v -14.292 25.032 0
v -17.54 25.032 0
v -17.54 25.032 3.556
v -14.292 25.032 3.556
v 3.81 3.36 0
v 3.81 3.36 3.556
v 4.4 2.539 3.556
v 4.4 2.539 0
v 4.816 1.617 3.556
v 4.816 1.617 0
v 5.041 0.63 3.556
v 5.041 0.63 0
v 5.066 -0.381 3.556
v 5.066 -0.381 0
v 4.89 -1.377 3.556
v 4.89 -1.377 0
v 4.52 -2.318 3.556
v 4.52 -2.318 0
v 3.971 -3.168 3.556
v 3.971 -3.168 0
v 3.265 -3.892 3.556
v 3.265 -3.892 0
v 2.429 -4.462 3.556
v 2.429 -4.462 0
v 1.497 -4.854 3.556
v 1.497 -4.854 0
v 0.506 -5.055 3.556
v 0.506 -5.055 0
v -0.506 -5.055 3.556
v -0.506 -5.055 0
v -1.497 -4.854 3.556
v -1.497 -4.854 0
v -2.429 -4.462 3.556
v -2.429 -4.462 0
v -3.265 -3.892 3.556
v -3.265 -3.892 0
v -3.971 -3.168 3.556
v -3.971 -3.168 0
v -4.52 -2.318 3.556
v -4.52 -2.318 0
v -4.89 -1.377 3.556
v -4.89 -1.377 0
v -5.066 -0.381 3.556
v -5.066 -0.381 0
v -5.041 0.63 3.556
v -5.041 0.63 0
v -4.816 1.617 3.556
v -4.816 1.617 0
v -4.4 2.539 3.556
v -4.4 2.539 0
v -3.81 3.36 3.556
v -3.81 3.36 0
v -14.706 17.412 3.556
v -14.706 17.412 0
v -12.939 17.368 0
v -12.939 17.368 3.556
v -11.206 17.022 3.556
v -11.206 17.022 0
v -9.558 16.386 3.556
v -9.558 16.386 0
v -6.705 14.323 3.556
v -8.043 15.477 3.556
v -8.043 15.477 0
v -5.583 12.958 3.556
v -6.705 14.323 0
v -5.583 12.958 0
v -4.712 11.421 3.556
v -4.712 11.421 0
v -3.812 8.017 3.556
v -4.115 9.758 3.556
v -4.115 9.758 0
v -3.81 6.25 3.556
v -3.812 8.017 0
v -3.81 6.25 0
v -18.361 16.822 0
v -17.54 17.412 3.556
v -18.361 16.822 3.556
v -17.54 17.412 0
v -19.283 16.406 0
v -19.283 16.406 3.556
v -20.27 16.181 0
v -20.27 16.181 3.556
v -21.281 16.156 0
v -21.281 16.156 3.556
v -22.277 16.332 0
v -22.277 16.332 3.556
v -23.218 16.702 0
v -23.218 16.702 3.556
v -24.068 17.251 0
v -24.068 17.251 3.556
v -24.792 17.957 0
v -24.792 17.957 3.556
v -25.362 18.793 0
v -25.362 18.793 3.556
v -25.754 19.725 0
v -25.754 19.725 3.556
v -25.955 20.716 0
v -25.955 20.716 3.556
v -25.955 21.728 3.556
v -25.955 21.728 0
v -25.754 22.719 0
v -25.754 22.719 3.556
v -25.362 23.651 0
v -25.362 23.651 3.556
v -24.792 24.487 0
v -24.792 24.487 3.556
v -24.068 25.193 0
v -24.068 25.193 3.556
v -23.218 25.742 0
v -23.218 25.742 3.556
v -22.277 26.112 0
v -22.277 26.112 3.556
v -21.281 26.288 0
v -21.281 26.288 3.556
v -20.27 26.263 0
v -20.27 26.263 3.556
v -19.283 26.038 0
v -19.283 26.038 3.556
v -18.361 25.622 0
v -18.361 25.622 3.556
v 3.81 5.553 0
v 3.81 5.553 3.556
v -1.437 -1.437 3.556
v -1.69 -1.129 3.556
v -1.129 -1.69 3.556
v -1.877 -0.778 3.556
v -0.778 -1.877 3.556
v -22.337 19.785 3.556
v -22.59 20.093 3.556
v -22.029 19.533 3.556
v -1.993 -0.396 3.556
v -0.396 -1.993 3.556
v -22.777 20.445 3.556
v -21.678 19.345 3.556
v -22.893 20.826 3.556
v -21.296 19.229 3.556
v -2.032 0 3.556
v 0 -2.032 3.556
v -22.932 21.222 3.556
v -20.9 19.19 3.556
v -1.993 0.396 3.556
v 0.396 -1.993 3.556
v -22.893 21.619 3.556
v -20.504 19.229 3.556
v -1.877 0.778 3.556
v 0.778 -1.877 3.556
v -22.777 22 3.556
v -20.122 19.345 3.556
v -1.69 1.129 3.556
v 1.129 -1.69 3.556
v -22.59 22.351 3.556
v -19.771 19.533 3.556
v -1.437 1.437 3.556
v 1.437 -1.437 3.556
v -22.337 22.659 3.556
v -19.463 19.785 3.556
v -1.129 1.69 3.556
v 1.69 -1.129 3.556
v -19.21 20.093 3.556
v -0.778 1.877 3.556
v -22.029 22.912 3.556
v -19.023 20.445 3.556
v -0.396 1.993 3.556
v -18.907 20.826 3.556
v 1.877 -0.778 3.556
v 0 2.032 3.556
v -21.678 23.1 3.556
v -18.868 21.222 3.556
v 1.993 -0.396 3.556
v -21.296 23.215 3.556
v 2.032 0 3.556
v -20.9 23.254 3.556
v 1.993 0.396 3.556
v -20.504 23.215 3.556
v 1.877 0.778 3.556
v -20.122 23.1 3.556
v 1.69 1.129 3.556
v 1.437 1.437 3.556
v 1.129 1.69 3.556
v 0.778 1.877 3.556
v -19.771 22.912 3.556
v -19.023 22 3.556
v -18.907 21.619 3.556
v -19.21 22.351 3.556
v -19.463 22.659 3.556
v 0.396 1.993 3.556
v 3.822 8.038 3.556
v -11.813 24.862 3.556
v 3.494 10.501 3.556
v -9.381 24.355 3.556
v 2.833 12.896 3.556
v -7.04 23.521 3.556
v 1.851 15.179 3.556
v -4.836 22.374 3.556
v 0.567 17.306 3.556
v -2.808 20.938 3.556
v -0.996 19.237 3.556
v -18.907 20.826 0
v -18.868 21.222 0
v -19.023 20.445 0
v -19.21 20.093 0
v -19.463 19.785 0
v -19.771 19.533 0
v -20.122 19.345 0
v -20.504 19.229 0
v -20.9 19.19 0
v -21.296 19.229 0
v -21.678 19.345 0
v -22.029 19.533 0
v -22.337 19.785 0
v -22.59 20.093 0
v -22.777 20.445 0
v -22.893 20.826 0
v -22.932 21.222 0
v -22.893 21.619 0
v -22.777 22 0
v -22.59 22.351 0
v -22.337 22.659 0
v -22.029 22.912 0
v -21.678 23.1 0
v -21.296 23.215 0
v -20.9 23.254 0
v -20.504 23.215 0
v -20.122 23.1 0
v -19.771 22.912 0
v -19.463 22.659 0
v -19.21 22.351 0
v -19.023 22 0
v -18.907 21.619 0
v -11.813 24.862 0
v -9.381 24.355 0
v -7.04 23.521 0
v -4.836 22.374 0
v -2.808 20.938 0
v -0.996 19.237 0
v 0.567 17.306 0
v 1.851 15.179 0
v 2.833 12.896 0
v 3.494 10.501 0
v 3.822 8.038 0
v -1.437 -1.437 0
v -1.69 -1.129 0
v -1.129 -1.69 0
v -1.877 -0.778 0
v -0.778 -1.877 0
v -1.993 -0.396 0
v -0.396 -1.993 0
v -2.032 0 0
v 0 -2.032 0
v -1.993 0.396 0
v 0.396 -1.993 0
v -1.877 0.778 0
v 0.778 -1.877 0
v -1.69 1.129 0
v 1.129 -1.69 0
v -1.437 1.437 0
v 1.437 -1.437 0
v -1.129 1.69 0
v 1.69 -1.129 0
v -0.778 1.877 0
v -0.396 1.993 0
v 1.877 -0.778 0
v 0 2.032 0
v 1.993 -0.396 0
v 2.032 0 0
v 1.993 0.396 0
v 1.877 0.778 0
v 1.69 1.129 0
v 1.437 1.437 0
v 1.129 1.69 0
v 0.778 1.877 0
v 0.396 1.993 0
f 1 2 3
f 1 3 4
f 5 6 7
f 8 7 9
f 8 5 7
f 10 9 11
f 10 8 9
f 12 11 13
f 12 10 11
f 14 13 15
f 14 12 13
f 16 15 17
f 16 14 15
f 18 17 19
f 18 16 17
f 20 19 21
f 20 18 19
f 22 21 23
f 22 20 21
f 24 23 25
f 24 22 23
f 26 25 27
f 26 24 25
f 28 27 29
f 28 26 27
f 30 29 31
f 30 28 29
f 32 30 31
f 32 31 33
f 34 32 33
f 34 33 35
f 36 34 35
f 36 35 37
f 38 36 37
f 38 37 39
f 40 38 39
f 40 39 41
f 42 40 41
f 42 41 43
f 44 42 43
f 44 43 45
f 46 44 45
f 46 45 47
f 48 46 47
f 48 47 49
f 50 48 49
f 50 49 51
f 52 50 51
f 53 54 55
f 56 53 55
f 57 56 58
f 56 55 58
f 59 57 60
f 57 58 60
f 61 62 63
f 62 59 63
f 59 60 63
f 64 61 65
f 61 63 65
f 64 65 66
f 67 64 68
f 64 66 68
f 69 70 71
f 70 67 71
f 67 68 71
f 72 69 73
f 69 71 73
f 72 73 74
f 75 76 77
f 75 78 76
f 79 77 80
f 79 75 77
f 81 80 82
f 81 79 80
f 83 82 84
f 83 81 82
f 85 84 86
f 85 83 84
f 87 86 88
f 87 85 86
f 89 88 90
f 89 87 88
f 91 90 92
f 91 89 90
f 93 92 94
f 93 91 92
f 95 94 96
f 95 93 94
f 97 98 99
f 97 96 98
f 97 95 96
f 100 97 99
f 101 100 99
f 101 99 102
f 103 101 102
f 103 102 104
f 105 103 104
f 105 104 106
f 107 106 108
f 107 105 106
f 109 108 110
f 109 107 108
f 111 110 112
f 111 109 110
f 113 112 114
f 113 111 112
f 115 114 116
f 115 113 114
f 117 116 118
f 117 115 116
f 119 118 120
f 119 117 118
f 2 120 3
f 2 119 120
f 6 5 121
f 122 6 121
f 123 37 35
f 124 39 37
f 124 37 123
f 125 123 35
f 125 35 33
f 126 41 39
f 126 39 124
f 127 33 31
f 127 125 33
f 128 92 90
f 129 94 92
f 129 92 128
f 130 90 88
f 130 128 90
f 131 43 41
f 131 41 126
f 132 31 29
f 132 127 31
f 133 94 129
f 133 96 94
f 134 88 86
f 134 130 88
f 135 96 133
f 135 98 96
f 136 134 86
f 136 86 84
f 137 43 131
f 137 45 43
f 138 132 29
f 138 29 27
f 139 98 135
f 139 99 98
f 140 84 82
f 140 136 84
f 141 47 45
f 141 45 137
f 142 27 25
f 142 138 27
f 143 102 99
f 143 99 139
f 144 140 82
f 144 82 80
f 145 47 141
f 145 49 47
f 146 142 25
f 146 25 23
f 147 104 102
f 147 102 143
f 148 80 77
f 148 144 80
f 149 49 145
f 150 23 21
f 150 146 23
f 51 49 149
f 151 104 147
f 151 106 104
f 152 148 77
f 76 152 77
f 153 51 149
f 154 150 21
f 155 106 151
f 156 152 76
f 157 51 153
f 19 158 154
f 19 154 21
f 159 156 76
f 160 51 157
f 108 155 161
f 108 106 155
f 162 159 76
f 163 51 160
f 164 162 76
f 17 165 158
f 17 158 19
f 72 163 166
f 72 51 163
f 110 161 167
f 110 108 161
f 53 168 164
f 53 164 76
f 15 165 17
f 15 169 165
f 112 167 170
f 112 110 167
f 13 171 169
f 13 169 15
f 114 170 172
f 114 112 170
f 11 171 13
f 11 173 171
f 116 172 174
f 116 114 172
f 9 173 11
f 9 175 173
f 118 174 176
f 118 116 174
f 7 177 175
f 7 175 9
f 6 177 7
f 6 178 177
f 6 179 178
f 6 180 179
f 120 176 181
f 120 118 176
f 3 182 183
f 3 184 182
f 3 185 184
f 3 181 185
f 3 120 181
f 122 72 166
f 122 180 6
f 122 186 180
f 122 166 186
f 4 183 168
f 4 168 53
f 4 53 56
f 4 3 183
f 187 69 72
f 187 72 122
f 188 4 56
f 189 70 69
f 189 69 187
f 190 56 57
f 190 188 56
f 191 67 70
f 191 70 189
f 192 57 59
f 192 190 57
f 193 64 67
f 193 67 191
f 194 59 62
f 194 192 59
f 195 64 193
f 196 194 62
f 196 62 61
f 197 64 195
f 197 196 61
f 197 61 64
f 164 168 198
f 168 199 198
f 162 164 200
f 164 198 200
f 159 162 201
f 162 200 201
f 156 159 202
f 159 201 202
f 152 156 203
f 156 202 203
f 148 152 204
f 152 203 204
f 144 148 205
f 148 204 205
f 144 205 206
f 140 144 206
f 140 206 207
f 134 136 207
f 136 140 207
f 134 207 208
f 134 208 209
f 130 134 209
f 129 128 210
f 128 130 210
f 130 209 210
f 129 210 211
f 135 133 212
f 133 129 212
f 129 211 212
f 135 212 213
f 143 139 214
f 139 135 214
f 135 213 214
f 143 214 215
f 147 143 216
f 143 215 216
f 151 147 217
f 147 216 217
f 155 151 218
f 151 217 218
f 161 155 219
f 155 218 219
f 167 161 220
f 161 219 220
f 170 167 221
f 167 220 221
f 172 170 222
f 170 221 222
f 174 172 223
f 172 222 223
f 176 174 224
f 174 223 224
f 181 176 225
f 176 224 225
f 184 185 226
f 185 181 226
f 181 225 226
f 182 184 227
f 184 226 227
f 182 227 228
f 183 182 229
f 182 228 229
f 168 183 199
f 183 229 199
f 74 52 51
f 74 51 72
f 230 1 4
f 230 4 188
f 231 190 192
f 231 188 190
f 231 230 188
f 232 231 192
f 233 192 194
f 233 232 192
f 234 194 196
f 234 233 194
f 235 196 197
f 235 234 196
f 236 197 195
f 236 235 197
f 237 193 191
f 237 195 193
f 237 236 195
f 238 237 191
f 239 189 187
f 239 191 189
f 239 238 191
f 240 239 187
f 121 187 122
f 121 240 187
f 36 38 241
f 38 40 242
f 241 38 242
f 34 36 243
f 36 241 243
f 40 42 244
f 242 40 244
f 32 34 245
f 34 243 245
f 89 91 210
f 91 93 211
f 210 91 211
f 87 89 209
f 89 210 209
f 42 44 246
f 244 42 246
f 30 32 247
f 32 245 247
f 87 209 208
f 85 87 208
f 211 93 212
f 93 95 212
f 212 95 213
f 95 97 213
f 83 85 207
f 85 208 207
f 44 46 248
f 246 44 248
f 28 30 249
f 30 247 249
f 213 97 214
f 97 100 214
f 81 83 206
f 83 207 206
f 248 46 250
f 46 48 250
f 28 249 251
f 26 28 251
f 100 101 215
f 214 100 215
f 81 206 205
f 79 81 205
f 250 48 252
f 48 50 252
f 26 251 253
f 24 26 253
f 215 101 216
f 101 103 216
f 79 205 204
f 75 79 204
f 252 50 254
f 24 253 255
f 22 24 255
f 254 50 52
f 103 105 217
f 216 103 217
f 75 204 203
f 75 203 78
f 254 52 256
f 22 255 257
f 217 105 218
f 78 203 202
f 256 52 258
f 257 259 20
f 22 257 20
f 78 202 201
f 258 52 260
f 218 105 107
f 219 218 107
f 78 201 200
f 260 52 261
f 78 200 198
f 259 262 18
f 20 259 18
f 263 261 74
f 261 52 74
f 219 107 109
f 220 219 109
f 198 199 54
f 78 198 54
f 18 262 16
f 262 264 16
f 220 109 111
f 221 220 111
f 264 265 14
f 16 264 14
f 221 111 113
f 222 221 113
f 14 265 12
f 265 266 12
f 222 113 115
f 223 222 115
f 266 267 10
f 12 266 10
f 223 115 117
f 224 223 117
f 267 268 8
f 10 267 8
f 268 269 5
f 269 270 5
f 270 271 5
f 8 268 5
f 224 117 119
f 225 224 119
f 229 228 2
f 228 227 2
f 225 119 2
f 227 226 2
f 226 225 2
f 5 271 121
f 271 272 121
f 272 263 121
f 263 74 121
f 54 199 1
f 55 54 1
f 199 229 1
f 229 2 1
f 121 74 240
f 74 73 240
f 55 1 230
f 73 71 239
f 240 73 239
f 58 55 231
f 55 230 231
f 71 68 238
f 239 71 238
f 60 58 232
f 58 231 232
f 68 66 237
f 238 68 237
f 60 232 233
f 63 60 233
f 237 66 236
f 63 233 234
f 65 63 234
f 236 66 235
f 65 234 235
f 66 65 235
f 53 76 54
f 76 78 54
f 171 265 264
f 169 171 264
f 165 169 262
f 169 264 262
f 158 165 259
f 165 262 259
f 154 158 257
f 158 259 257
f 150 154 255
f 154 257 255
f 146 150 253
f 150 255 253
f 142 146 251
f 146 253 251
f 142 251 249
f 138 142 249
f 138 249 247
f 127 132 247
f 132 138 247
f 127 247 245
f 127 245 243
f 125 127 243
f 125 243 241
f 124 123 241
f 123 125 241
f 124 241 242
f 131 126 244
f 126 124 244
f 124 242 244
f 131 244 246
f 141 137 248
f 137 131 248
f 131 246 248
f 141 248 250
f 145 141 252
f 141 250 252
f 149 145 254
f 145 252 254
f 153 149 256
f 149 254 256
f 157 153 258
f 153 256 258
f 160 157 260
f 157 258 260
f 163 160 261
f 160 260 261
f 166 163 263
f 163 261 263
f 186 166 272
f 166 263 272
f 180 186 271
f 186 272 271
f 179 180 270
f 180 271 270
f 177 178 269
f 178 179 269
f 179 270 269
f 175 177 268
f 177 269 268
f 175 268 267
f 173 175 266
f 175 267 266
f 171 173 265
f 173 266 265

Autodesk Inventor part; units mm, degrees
ref_plane "YZ Plane" through (0, 0, 0) normal (1, 0, 0) x (0, 1, 0)
ref_plane "XZ Plane" through (0, 0, 0) normal (0, 1, 0) x (-1, 0, 0)
ref_plane "XY Plane" through (0, 0, 0) normal (0, 0, 1) x (1, 0, 0)
sketch "Sketch1" plane through (0, 0, 0) normal (0, 0, 1) x (1, 0, 0)
  circle A0 centre (0, 0) radius 2.032
  circle A1 centre (0, 0) radius 5.08
  line L0 (3.81, 3.3601) -> (3.81, 5.5534)
  line L1 (-3.81, 3.3601) -> (-3.81, 6.2503)
  circle A2 centre (-20.9, 21.2222) radius 2.032
  circle A3 centre (-20.9, 21.2222) radius 5.08
  line L2 (-17.5399, 25.0322) -> (-14.2921, 25.0322)
  line L3 (-17.5399, 17.4122) -> (-14.7055, 17.4122)
  arc A4 (-3.81, 6.2503) -> (-14.7055, 17.4122) centre (-14.0813, 7.1228) ccw
  arc A5 (3.81, 5.5534) -> (-14.2921, 25.0322) centre (-14.2921, 6.8814) ccw
  point P0 (-3.81, 4.8052)
  dimension "d0" = 4.064
  dimension "d1" = 10.16
  dimension "d2" = 7.62
  dimension "d3" = 3.81
  dimension "d4" = 4.064
  dimension "d5" = 10.16
  dimension "d6" = 7.62
  dimension "d7" = 3.81
extrude "Extrusion1" add sketch "Sketch1" along normal blind 3.556
equation "\"d3\" = 0.5 * d2"
equation "\"d7\" = 0.5 * d6"
properties part number "Push Arm"
